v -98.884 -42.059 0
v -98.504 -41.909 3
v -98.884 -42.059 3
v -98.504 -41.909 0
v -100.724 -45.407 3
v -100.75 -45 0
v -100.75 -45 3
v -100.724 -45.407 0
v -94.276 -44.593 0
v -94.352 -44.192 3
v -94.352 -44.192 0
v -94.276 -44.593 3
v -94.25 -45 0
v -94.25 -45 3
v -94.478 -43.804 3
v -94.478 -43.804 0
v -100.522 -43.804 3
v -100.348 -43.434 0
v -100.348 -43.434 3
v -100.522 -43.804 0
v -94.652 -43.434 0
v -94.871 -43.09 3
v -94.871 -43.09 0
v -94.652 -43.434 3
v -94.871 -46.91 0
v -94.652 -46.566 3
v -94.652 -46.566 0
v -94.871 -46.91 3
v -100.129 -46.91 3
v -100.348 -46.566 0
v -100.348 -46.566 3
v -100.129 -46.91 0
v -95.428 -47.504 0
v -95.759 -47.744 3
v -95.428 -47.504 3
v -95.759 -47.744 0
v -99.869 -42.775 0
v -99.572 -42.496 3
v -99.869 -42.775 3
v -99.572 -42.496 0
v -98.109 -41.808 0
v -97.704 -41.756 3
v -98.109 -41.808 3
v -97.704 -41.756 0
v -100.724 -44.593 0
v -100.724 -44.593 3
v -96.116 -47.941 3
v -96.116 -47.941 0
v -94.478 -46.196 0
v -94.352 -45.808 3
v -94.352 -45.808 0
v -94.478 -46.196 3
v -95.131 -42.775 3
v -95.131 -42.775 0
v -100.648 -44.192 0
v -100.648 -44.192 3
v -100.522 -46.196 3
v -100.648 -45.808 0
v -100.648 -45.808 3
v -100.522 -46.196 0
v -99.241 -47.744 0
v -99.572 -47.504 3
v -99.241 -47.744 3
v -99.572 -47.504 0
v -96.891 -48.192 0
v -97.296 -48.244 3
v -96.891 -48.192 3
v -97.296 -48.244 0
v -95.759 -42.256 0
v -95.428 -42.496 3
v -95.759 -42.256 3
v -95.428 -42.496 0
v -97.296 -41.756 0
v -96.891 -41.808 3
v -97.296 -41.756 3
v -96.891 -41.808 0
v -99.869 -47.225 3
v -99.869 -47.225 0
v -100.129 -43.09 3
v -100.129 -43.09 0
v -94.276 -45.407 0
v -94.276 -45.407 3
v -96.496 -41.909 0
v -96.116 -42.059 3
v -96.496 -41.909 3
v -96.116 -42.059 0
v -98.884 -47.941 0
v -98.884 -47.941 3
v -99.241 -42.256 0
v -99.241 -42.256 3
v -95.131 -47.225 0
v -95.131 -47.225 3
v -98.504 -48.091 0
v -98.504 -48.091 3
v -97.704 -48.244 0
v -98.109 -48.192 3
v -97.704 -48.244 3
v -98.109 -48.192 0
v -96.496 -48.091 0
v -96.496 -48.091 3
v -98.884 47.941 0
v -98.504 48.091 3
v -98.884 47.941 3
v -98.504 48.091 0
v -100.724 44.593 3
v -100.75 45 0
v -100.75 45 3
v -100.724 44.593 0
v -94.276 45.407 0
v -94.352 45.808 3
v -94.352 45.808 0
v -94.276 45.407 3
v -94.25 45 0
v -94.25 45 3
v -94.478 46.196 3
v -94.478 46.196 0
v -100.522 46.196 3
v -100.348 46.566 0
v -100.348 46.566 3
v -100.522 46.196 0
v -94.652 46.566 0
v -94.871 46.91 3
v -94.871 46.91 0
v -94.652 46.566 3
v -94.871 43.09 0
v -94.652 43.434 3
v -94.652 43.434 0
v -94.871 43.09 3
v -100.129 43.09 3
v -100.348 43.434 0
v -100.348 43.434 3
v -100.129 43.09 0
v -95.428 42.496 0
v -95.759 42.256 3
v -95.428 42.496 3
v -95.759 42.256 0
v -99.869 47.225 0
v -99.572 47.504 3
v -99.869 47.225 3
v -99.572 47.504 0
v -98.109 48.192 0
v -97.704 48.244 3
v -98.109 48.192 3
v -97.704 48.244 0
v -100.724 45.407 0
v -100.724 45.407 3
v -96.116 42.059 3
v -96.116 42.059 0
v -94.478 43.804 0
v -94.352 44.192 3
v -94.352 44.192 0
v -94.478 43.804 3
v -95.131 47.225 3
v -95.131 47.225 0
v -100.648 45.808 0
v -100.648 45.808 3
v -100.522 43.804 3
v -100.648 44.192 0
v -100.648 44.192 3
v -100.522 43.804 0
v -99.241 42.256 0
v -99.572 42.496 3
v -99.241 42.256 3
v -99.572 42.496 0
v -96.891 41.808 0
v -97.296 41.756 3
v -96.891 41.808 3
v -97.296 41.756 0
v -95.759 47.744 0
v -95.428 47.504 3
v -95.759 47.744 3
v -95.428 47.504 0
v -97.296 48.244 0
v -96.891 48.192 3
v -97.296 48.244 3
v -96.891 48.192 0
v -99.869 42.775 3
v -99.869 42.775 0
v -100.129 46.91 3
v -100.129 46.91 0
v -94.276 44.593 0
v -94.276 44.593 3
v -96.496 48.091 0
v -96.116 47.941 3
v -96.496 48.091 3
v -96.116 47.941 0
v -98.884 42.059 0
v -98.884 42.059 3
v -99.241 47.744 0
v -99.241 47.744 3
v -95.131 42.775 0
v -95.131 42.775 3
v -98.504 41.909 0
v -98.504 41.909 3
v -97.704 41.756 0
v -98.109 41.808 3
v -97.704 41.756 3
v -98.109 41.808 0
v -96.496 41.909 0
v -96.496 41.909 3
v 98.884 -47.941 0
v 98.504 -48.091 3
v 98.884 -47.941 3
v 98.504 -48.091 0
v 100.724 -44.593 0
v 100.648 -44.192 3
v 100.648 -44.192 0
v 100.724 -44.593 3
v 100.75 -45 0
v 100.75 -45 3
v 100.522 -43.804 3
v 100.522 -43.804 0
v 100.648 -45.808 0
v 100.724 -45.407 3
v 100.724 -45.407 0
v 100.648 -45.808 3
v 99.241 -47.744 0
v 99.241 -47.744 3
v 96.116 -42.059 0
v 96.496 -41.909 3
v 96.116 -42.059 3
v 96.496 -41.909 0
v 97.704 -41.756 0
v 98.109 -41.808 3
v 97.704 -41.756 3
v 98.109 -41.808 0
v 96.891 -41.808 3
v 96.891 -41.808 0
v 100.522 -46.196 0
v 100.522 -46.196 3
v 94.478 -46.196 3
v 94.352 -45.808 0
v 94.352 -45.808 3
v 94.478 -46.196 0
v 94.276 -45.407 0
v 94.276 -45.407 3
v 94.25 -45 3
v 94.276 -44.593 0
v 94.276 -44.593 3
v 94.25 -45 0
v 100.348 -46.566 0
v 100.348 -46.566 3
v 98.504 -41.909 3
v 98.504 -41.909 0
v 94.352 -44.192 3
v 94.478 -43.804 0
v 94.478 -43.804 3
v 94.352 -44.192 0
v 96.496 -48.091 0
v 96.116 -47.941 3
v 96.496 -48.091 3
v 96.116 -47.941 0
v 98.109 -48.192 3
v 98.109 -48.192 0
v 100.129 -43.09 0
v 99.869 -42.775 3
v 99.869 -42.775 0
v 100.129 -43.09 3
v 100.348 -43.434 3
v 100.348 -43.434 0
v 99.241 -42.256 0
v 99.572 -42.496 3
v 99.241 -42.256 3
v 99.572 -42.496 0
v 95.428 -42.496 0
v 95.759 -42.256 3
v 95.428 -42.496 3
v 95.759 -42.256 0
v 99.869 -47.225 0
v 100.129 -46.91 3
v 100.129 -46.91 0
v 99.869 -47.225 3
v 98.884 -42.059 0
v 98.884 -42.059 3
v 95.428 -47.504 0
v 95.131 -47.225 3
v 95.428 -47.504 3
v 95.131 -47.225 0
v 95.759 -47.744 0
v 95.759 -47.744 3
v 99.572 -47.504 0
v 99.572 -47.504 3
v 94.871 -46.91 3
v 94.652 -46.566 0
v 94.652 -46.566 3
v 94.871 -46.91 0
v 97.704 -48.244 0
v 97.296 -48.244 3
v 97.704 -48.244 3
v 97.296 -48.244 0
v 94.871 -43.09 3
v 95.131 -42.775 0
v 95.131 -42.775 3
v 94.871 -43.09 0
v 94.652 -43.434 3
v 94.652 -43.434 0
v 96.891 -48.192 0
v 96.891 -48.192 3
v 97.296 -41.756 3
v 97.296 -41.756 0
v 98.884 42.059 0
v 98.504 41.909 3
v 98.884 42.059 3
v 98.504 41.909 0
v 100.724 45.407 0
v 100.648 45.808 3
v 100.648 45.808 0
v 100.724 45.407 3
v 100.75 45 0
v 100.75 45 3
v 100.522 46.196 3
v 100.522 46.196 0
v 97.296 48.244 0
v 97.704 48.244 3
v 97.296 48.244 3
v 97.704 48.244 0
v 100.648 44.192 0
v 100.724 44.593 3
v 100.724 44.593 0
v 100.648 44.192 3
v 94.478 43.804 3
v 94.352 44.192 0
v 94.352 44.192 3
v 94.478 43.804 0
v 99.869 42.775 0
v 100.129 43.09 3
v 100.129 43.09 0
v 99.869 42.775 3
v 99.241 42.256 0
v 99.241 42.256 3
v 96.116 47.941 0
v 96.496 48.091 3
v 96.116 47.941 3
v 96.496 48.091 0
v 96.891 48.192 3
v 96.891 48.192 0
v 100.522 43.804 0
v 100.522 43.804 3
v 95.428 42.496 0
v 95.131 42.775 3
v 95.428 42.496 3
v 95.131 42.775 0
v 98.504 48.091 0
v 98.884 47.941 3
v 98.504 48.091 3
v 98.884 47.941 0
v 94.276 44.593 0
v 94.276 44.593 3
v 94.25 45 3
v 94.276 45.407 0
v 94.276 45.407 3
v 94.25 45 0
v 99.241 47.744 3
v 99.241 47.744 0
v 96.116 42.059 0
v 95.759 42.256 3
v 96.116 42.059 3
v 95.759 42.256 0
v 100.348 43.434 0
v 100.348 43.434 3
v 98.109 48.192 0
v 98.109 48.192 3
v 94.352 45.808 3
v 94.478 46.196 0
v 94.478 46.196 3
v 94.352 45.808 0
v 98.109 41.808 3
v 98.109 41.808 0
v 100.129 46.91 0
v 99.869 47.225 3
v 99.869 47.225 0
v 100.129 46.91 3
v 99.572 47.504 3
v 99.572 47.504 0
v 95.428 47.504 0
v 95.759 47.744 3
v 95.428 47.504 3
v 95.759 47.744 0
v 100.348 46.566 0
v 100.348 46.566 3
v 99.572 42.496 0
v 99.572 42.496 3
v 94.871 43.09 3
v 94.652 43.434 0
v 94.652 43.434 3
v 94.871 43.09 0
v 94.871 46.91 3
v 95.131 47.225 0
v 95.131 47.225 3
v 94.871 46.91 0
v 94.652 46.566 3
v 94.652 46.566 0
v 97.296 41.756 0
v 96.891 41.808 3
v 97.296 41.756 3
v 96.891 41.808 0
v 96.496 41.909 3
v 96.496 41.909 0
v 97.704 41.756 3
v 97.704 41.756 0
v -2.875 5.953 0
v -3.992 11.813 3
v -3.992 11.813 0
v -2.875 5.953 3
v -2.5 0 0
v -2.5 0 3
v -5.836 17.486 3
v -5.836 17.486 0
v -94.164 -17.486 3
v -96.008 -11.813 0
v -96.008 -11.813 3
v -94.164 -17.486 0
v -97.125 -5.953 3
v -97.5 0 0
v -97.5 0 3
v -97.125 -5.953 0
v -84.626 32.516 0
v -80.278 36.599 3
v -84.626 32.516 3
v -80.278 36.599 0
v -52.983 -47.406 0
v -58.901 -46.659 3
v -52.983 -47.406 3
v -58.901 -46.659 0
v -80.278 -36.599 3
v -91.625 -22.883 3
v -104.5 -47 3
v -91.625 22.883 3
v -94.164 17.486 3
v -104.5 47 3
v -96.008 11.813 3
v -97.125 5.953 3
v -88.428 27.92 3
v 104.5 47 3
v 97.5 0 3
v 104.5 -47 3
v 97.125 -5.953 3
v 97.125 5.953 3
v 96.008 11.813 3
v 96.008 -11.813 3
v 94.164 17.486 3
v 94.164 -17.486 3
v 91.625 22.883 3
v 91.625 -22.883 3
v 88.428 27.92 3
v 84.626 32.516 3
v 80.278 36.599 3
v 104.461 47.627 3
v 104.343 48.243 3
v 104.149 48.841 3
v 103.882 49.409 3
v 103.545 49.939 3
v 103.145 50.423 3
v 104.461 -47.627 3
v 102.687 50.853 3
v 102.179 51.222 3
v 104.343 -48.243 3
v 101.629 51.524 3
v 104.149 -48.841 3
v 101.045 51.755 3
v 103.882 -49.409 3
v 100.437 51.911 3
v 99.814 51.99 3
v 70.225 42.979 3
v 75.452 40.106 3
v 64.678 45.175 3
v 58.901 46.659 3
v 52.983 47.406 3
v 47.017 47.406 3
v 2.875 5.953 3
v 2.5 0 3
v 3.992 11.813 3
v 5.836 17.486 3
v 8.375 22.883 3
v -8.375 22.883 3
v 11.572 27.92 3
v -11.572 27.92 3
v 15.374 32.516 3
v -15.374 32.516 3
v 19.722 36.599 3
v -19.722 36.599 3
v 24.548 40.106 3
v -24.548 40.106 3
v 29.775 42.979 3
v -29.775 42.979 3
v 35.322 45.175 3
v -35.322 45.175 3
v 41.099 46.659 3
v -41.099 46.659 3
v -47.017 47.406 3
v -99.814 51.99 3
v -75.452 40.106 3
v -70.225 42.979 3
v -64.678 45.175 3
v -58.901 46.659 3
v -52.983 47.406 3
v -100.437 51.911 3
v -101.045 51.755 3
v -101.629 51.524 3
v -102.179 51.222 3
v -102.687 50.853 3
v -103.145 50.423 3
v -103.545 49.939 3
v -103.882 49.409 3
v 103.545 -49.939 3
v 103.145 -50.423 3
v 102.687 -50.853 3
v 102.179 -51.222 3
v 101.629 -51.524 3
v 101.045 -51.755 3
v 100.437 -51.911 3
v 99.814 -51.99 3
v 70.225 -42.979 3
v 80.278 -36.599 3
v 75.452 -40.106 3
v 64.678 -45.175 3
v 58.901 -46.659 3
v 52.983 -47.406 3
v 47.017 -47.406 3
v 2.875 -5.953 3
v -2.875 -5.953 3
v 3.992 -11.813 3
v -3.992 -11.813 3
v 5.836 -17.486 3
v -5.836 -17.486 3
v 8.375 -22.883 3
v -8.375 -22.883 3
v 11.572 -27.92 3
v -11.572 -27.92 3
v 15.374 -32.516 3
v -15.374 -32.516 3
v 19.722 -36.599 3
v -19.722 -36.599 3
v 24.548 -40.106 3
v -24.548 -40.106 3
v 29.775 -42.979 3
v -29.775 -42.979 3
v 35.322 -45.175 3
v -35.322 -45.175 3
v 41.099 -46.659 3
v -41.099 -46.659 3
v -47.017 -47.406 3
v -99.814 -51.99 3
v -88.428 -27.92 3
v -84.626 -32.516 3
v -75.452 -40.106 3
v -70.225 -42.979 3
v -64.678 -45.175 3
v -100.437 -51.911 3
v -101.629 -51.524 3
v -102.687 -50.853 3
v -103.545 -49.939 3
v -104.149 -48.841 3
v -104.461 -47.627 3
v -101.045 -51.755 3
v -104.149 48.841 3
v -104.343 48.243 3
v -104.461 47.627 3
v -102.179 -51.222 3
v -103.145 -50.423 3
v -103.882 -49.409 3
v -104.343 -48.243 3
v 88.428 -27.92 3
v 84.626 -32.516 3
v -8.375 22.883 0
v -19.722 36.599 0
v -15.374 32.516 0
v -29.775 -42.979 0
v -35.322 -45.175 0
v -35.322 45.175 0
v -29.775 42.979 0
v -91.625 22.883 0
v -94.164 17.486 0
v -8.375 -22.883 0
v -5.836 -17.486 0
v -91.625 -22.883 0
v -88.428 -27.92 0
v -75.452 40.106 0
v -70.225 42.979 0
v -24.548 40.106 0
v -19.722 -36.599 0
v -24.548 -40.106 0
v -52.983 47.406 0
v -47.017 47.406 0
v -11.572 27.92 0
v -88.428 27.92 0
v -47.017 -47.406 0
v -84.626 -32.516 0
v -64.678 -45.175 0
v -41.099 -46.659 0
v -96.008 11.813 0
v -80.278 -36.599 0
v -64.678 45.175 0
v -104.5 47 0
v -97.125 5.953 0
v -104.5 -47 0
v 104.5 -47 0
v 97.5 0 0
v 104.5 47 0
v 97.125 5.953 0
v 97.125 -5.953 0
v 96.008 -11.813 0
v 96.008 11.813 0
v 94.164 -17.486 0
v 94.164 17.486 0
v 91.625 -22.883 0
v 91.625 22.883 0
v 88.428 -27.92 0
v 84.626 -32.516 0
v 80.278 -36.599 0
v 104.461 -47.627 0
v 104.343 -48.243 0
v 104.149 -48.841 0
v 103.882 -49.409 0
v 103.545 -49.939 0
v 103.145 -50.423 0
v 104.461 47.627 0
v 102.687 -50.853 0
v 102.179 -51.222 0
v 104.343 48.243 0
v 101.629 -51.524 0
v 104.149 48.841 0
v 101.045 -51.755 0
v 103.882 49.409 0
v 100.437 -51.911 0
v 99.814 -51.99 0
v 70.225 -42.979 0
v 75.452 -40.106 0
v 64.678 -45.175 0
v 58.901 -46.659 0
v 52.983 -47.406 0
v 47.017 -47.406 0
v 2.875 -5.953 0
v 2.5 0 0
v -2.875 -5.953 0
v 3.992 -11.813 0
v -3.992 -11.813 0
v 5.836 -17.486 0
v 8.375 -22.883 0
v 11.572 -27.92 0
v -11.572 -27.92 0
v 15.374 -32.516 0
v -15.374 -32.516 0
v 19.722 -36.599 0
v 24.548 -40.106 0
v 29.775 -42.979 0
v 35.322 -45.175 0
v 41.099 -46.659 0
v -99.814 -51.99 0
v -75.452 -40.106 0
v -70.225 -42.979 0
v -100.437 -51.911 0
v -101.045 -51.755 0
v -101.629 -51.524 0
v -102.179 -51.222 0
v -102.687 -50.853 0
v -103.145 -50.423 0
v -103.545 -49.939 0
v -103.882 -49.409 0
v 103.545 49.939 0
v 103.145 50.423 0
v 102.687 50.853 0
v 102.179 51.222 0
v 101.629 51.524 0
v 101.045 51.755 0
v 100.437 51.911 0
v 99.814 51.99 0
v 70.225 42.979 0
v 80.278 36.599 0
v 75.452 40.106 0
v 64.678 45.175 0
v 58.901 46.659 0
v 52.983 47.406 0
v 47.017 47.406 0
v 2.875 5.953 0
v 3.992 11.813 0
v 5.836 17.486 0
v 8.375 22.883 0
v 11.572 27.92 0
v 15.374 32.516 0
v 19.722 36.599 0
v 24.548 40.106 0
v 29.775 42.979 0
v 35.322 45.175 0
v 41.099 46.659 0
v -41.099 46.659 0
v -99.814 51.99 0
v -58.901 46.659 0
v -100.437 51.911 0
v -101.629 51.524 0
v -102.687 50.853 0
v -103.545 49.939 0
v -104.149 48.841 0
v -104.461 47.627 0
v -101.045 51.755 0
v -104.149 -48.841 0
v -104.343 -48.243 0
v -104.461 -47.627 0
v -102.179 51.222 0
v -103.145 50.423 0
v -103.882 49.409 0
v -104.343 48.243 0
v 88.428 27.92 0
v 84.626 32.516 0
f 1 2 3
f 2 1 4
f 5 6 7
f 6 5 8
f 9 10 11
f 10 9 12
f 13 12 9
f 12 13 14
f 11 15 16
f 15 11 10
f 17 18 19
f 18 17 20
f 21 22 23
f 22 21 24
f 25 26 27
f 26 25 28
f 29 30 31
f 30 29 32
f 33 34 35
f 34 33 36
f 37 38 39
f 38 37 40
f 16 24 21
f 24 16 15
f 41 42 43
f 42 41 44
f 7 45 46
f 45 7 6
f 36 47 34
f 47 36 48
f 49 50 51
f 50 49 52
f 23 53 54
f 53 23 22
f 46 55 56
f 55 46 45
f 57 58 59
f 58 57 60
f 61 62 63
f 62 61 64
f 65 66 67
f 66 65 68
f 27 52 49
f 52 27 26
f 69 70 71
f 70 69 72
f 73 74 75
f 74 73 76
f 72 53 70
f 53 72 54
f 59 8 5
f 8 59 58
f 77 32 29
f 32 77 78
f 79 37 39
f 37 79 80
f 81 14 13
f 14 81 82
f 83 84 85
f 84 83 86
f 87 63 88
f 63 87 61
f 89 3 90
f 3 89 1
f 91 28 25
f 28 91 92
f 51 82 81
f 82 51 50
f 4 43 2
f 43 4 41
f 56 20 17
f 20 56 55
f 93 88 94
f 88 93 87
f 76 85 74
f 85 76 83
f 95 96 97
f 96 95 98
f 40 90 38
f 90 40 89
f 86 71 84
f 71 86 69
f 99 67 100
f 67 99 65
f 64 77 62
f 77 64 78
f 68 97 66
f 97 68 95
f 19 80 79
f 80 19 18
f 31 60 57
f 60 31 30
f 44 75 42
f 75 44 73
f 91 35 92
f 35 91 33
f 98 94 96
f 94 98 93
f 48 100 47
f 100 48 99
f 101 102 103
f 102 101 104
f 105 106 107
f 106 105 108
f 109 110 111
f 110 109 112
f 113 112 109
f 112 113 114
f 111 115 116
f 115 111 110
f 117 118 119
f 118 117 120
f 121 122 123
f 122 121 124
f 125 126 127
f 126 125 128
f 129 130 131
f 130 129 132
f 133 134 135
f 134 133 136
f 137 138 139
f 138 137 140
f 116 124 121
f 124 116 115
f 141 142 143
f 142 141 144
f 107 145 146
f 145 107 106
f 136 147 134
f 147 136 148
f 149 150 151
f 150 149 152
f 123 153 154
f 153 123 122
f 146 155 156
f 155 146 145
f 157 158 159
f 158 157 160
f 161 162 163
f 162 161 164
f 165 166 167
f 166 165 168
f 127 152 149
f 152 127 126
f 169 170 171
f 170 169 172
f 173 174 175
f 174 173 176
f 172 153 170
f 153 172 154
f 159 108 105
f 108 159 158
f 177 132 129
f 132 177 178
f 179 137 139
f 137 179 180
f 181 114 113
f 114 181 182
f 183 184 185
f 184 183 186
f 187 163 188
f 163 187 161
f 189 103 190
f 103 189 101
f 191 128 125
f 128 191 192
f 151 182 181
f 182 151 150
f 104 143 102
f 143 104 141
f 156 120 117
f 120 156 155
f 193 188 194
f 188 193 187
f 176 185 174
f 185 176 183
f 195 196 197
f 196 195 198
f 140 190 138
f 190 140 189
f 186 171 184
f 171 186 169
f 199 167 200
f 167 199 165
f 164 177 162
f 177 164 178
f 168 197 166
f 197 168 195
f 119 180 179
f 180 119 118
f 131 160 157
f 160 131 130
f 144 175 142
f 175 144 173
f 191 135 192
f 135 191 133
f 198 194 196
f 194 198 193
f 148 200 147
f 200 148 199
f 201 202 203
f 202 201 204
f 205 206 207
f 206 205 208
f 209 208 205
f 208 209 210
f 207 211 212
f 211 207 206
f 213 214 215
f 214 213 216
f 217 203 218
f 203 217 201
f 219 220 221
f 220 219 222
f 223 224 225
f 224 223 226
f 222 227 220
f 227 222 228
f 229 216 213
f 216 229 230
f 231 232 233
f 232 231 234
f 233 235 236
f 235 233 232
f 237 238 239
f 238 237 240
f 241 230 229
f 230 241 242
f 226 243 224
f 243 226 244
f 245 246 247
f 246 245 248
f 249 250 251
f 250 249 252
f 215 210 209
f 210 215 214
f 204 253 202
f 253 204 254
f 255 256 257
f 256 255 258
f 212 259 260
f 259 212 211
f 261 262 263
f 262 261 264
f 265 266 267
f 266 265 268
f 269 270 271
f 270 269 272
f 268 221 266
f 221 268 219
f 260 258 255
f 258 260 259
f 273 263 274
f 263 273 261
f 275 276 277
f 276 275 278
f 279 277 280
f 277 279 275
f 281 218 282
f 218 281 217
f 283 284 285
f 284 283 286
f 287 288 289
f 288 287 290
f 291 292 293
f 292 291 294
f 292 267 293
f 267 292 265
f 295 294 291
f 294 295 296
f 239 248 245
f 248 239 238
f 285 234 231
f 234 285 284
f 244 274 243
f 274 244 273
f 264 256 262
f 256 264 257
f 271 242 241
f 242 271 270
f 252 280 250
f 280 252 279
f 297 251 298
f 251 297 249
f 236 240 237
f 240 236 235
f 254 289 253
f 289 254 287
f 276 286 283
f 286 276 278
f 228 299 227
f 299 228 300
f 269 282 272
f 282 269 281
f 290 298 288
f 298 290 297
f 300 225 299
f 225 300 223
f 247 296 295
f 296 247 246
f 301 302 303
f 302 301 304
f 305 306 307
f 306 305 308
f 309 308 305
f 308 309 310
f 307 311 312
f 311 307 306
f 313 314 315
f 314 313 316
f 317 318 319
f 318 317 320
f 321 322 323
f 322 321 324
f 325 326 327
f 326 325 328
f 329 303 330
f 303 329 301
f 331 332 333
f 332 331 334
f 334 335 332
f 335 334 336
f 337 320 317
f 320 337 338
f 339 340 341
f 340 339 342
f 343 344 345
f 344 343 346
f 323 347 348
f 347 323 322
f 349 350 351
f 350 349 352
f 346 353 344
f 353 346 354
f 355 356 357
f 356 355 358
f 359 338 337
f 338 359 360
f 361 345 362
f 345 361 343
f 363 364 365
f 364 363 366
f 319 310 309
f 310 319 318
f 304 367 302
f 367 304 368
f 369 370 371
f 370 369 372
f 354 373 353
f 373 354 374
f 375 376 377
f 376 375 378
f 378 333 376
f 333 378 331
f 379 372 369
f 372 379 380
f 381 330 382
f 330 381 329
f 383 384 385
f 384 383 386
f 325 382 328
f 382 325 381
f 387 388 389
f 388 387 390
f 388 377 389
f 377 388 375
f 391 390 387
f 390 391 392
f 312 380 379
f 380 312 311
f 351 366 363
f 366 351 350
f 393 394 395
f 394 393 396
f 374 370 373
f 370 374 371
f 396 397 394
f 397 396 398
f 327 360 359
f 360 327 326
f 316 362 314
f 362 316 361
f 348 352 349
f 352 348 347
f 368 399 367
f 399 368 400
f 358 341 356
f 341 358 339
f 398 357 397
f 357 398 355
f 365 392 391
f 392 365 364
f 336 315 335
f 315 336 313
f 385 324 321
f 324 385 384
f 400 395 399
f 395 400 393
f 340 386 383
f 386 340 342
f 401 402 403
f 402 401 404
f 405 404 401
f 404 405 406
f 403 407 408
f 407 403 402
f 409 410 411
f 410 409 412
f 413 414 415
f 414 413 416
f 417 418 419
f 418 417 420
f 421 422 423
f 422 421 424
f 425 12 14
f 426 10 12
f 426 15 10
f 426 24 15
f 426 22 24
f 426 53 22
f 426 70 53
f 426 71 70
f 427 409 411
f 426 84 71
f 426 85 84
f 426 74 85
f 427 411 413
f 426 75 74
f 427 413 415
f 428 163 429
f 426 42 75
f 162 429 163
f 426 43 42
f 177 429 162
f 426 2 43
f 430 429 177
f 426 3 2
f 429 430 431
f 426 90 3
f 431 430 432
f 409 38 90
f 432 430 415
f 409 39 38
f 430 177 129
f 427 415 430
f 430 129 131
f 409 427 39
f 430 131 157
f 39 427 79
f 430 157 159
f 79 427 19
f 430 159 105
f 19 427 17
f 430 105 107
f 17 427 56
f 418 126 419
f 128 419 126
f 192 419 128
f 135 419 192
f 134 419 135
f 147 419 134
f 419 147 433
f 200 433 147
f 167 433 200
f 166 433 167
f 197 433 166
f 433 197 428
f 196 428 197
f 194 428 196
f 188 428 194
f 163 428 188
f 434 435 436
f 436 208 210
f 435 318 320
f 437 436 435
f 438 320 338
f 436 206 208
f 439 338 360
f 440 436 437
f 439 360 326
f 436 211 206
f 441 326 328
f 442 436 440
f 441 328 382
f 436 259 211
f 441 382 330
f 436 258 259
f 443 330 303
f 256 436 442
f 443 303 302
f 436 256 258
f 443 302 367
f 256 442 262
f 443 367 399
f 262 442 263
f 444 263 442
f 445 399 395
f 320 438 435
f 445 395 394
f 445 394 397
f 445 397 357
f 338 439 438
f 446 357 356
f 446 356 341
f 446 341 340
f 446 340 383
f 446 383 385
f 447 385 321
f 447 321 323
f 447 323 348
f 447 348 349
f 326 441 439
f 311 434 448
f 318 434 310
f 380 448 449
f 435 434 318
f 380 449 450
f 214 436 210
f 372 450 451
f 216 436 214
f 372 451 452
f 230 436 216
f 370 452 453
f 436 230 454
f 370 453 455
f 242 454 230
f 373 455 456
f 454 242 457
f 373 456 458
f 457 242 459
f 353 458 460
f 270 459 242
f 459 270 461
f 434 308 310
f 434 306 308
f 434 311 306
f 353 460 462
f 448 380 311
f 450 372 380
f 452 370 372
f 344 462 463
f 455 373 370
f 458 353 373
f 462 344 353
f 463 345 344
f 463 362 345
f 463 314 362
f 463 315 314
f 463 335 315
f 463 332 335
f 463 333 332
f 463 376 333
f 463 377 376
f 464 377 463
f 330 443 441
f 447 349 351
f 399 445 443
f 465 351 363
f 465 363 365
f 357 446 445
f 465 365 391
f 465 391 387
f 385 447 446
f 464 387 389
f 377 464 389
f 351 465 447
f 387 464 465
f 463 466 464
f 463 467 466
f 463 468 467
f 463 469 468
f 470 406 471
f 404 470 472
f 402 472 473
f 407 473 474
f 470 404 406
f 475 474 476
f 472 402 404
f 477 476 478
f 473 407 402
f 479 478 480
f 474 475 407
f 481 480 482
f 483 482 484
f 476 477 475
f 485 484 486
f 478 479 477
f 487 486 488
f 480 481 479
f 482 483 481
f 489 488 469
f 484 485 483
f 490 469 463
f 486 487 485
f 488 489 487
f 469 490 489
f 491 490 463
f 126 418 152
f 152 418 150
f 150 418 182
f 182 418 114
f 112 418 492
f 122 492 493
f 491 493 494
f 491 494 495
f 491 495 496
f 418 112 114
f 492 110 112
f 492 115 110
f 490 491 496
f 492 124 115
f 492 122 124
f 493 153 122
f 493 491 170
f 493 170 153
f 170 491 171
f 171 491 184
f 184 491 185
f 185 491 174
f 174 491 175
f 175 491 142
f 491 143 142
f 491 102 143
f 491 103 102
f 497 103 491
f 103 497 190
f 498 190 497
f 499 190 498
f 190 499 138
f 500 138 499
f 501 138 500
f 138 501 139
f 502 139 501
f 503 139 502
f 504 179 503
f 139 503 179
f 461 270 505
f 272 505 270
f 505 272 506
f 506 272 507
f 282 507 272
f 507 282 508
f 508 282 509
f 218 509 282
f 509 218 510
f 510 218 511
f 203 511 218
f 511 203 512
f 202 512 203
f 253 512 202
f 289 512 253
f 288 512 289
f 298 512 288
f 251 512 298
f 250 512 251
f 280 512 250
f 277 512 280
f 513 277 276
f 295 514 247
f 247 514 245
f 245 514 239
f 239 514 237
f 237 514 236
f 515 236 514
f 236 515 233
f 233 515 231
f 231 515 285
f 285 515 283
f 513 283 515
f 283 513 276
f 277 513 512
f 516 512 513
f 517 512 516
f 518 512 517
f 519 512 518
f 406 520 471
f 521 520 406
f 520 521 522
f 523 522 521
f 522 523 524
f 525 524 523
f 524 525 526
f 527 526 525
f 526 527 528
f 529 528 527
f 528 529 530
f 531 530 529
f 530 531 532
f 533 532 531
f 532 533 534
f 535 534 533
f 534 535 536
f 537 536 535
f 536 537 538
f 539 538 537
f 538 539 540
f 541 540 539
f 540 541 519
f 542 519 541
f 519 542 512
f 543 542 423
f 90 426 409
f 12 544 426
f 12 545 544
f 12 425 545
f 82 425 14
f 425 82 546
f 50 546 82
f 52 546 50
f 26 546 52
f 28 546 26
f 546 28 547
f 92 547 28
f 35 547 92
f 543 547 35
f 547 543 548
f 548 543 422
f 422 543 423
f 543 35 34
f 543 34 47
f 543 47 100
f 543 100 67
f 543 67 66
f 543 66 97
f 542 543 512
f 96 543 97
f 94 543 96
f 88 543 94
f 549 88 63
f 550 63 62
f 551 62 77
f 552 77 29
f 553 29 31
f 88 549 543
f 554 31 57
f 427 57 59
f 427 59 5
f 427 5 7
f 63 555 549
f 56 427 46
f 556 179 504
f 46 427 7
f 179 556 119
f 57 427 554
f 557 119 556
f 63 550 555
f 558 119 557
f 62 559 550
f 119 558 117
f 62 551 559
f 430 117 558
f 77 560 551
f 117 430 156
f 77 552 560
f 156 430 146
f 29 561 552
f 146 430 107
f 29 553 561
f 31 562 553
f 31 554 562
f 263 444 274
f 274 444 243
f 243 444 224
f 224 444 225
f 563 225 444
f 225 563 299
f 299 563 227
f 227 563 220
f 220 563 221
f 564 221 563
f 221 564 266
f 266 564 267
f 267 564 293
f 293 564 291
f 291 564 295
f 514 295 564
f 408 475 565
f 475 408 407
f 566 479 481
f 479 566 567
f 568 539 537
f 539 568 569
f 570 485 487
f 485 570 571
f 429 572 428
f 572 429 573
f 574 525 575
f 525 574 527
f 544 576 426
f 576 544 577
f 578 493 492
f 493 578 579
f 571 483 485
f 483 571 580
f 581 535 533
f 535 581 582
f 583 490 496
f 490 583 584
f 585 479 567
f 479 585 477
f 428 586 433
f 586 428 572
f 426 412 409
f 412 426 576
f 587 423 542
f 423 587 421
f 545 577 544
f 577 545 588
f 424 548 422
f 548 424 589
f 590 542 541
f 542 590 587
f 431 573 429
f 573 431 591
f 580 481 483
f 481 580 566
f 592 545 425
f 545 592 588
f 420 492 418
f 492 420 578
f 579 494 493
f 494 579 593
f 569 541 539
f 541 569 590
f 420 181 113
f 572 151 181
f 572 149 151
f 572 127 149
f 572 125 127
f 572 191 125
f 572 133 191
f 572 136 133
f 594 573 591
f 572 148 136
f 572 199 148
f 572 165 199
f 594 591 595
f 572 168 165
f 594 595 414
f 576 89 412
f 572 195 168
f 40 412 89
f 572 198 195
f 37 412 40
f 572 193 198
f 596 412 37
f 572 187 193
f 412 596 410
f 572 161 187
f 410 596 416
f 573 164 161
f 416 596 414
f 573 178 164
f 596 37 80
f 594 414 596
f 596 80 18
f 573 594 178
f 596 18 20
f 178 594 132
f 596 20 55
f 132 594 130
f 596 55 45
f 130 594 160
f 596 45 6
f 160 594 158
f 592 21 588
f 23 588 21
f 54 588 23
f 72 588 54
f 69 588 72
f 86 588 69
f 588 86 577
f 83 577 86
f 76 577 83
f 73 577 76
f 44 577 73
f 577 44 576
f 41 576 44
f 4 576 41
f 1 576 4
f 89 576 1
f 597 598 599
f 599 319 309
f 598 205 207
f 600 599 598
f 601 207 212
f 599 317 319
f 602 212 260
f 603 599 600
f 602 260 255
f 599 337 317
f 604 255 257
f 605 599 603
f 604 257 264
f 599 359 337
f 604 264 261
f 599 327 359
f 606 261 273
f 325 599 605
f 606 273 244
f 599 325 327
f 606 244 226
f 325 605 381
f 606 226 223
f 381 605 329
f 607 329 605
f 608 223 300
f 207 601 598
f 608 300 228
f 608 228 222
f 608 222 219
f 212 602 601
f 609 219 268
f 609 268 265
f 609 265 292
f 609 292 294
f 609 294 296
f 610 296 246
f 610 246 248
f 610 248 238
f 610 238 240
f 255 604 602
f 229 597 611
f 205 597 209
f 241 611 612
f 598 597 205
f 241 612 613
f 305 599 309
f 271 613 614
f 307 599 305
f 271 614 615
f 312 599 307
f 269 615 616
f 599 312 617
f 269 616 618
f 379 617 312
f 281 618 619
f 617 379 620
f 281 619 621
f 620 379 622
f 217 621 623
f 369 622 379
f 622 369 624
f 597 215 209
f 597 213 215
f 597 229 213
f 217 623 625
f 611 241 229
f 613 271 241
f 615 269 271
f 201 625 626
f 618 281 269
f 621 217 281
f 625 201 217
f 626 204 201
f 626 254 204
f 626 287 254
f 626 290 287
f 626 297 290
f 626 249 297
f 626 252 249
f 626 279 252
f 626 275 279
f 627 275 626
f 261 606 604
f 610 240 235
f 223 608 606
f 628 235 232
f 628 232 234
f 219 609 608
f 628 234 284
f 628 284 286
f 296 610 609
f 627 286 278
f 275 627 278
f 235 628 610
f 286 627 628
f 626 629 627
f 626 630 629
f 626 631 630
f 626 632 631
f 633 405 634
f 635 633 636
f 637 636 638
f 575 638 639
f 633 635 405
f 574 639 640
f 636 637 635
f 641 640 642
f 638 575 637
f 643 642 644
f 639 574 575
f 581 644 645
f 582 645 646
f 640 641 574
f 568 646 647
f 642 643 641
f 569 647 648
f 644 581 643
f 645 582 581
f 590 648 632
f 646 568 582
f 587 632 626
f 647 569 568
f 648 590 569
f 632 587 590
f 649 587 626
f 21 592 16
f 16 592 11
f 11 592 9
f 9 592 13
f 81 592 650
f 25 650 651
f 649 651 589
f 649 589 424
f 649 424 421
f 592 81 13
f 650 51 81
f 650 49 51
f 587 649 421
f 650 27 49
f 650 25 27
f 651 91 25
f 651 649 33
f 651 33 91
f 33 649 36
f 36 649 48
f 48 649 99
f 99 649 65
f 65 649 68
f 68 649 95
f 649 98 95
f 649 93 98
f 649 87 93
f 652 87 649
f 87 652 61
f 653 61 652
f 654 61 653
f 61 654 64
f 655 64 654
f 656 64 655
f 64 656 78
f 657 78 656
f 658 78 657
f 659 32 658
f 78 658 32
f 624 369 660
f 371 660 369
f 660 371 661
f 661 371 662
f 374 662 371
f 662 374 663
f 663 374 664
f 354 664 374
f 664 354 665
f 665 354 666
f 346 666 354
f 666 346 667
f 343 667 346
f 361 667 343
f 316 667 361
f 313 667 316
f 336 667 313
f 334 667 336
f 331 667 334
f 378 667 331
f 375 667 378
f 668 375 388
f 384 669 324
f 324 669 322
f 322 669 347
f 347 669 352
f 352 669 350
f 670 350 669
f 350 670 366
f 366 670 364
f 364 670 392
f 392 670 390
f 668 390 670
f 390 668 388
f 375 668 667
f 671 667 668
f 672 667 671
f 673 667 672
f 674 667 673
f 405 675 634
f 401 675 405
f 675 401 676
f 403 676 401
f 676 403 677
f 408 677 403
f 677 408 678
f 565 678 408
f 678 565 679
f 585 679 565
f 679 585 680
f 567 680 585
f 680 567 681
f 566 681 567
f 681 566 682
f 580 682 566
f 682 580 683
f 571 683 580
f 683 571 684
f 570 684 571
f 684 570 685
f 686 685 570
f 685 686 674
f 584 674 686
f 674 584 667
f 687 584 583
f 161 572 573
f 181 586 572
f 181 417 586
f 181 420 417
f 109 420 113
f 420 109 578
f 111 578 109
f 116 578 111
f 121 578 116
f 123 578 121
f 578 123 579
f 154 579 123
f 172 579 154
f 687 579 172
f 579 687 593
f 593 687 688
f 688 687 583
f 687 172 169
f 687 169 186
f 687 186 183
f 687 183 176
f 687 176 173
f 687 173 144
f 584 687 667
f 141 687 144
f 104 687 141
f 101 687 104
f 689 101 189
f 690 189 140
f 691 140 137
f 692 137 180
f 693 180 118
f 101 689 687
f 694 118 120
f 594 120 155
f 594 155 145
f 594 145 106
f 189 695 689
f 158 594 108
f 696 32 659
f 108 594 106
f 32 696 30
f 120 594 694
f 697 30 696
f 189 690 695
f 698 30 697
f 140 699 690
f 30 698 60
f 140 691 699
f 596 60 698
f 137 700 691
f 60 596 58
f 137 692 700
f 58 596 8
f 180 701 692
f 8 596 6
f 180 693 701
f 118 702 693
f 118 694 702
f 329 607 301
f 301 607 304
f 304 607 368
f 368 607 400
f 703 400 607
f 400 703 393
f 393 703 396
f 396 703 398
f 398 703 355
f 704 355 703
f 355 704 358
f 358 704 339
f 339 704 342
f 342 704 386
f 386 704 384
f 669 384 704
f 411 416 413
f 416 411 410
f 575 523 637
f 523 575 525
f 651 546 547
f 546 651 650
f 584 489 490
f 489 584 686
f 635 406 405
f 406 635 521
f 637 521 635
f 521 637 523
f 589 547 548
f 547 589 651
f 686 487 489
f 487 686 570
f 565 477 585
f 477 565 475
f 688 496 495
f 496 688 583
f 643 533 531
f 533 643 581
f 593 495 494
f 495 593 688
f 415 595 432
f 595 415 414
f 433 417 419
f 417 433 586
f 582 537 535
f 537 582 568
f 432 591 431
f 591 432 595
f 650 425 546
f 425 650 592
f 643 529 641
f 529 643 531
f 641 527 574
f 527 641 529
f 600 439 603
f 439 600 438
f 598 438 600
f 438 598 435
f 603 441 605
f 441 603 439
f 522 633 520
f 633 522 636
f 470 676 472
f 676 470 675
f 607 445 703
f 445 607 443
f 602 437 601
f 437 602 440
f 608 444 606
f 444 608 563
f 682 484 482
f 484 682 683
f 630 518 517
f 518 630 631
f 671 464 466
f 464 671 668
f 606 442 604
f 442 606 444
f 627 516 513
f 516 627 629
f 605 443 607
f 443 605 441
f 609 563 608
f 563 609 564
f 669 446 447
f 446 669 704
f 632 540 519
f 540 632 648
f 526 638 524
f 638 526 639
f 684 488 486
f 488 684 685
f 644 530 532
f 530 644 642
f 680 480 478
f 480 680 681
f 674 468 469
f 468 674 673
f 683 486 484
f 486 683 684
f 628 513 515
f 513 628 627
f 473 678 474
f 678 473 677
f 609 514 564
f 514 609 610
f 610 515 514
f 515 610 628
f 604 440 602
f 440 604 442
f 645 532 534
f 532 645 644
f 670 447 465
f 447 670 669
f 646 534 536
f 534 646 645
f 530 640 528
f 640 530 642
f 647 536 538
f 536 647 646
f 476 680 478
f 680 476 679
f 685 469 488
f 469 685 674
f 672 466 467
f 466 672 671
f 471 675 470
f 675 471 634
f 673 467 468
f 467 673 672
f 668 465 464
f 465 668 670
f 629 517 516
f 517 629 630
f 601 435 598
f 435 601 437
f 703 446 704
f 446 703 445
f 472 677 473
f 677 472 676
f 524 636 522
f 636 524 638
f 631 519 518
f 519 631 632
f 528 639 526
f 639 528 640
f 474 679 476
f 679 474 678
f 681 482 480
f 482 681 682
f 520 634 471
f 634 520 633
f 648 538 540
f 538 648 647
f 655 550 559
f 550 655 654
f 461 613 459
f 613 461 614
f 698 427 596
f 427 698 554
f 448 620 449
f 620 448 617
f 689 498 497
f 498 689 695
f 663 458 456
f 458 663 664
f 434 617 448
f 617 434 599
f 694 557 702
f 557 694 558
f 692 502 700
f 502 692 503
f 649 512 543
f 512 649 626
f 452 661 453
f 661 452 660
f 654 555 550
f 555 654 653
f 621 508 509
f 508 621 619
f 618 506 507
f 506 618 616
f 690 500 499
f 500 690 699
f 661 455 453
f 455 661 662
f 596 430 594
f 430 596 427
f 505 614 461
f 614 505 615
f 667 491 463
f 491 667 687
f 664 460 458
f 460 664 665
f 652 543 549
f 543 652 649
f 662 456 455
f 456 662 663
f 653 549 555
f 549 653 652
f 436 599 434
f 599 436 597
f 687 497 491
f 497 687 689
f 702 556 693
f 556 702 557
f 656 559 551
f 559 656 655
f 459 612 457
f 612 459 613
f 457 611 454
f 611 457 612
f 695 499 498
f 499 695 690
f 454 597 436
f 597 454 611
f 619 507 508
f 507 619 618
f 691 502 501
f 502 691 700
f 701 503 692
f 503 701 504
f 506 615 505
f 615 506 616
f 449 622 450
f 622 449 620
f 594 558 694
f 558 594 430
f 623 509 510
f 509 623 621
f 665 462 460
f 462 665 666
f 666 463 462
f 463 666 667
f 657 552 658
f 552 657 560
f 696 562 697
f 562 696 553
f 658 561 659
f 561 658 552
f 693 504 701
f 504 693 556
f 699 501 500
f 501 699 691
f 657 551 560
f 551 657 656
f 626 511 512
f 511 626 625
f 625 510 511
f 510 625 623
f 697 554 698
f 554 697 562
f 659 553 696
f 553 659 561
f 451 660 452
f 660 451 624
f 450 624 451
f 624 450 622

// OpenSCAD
$fn = 50;


difference() {
	union() {
		hull() {
			translate(v = [-99.5000000000, 47.0000000000, 0]) {
				cylinder(h = 3, r = 5);
			}
			translate(v = [99.5000000000, 47.0000000000, 0]) {
				cylinder(h = 3, r = 5);
			}
			translate(v = [-99.5000000000, -47.0000000000, 0]) {
				cylinder(h = 3, r = 5);
			}
			translate(v = [99.5000000000, -47.0000000000, 0]) {
				cylinder(h = 3, r = 5);
			}
		}
	}
	union() {
		#translate(v = [-97.5000000000, -45.0000000000, -100.0000000000]) {
			cylinder(h = 200, r = 3.2500000000);
		}
		#translate(v = [-97.5000000000, 45.0000000000, -100.0000000000]) {
			cylinder(h = 200, r = 3.2500000000);
		}
		#translate(v = [97.5000000000, -45.0000000000, -100.0000000000]) {
			cylinder(h = 200, r = 3.2500000000);
		}
		#translate(v = [97.5000000000, 45.0000000000, -100.0000000000]) {
			cylinder(h = 200, r = 3.2500000000);
		}
		#translate(v = [-50.0000000000, 0, 0]) {
			cylinder(h = 3, r = 47.5000000000);
		}
		#translate(v = [50.0000000000, 0, 0]) {
			cylinder(h = 3, r = 47.5000000000);
		}
	}
}
